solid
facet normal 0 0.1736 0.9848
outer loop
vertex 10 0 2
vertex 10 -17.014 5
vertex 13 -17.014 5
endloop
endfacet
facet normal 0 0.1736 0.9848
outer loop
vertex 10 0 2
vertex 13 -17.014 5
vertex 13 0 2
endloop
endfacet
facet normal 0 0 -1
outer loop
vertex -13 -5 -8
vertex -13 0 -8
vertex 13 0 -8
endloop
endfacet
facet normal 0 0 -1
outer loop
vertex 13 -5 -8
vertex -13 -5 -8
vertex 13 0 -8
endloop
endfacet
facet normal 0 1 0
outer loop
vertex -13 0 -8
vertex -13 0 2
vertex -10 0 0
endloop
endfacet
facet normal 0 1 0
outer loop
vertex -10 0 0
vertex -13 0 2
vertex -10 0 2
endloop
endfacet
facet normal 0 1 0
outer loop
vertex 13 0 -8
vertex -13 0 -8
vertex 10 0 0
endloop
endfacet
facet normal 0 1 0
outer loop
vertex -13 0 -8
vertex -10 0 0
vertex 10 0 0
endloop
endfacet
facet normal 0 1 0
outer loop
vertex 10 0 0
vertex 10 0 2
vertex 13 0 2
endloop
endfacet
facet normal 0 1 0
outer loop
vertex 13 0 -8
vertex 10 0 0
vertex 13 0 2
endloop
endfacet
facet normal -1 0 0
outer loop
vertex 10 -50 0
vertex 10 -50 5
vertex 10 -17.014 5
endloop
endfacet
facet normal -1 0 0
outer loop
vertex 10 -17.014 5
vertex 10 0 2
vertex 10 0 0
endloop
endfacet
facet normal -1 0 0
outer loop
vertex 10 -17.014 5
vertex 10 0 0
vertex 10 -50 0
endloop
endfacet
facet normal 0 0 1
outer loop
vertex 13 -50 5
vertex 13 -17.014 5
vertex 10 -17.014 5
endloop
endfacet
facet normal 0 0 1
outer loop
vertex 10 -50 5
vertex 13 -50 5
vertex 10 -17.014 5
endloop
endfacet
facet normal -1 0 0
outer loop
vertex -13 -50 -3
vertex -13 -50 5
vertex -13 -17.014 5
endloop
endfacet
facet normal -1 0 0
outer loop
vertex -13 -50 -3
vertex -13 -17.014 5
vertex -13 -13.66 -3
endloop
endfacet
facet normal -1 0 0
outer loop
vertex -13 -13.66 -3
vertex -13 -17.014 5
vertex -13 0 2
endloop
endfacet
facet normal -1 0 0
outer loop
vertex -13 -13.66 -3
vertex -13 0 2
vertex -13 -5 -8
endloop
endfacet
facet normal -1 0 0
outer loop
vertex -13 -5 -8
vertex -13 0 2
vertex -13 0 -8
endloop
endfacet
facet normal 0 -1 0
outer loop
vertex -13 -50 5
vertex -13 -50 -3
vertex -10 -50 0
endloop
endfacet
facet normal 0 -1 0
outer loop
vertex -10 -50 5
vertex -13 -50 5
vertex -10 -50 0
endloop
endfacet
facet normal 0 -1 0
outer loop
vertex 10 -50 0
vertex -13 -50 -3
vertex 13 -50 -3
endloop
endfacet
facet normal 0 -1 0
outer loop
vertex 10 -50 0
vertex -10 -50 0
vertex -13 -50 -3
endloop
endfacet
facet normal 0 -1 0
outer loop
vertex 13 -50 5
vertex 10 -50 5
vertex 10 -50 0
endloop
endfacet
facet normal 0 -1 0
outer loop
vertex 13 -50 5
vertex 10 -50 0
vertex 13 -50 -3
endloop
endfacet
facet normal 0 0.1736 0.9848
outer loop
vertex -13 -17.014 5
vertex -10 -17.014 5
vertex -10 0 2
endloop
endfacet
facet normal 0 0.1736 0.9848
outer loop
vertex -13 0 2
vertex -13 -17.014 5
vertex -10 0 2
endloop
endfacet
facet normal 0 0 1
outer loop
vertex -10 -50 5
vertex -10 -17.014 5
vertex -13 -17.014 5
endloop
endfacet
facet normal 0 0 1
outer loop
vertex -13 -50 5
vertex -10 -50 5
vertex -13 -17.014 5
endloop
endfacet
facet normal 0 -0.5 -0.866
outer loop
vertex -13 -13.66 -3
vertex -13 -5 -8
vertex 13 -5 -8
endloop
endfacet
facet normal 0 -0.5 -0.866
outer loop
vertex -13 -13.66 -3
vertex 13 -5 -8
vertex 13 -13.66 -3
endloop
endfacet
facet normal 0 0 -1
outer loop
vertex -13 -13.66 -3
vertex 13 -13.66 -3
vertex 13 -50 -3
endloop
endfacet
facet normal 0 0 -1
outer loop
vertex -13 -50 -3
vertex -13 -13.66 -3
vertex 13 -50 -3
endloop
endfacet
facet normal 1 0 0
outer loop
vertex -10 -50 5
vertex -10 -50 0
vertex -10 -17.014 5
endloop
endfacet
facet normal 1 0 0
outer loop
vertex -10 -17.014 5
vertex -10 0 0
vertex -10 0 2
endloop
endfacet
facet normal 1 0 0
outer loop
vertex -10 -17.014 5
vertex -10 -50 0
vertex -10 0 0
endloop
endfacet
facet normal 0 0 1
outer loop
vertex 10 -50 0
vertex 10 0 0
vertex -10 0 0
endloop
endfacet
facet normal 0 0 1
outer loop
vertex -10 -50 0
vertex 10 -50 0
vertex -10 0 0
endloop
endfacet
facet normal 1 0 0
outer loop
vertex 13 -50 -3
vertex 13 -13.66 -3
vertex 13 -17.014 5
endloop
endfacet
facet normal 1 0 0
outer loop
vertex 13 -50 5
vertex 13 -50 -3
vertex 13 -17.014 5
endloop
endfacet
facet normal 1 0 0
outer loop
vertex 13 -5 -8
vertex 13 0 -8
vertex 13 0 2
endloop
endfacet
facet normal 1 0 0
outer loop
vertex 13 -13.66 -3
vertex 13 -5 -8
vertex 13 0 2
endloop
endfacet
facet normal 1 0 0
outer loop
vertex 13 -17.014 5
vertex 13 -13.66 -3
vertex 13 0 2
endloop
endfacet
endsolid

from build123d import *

# Parameters (mm, degrees)
PAD_DEPTH         = 50
POCKET_DEPTH      = 13.001
POCKET_DEPTH_BACK = -13.001


with BuildPart() as part:
    # Sketch → Pad (new body)
    with BuildSketch(Plane.XZ):
        Polygon((-13, 5), (-13, -8), (13, -8), (13, 5), (10, 5), (10, 0), (-10, 0), (-10, 5), align=None)
    extrude(amount=PAD_DEPTH)

    # Sketch001 → Pocket (cut, two sides)
    with BuildSketch(Plane.YZ) as pocket_sk:
        Polygon((-17.013845, 5), (0, 2), (0, 5), align=None)
        Polygon((-50, -3), (-50, -8), (-5, -8), (-13.660254, -3), align=None)
    extrude(amount=-POCKET_DEPTH, mode=Mode.SUBTRACT)
    extrude(pocket_sk.sketch, amount=-POCKET_DEPTH_BACK, mode=Mode.SUBTRACT)


solid = part.part
